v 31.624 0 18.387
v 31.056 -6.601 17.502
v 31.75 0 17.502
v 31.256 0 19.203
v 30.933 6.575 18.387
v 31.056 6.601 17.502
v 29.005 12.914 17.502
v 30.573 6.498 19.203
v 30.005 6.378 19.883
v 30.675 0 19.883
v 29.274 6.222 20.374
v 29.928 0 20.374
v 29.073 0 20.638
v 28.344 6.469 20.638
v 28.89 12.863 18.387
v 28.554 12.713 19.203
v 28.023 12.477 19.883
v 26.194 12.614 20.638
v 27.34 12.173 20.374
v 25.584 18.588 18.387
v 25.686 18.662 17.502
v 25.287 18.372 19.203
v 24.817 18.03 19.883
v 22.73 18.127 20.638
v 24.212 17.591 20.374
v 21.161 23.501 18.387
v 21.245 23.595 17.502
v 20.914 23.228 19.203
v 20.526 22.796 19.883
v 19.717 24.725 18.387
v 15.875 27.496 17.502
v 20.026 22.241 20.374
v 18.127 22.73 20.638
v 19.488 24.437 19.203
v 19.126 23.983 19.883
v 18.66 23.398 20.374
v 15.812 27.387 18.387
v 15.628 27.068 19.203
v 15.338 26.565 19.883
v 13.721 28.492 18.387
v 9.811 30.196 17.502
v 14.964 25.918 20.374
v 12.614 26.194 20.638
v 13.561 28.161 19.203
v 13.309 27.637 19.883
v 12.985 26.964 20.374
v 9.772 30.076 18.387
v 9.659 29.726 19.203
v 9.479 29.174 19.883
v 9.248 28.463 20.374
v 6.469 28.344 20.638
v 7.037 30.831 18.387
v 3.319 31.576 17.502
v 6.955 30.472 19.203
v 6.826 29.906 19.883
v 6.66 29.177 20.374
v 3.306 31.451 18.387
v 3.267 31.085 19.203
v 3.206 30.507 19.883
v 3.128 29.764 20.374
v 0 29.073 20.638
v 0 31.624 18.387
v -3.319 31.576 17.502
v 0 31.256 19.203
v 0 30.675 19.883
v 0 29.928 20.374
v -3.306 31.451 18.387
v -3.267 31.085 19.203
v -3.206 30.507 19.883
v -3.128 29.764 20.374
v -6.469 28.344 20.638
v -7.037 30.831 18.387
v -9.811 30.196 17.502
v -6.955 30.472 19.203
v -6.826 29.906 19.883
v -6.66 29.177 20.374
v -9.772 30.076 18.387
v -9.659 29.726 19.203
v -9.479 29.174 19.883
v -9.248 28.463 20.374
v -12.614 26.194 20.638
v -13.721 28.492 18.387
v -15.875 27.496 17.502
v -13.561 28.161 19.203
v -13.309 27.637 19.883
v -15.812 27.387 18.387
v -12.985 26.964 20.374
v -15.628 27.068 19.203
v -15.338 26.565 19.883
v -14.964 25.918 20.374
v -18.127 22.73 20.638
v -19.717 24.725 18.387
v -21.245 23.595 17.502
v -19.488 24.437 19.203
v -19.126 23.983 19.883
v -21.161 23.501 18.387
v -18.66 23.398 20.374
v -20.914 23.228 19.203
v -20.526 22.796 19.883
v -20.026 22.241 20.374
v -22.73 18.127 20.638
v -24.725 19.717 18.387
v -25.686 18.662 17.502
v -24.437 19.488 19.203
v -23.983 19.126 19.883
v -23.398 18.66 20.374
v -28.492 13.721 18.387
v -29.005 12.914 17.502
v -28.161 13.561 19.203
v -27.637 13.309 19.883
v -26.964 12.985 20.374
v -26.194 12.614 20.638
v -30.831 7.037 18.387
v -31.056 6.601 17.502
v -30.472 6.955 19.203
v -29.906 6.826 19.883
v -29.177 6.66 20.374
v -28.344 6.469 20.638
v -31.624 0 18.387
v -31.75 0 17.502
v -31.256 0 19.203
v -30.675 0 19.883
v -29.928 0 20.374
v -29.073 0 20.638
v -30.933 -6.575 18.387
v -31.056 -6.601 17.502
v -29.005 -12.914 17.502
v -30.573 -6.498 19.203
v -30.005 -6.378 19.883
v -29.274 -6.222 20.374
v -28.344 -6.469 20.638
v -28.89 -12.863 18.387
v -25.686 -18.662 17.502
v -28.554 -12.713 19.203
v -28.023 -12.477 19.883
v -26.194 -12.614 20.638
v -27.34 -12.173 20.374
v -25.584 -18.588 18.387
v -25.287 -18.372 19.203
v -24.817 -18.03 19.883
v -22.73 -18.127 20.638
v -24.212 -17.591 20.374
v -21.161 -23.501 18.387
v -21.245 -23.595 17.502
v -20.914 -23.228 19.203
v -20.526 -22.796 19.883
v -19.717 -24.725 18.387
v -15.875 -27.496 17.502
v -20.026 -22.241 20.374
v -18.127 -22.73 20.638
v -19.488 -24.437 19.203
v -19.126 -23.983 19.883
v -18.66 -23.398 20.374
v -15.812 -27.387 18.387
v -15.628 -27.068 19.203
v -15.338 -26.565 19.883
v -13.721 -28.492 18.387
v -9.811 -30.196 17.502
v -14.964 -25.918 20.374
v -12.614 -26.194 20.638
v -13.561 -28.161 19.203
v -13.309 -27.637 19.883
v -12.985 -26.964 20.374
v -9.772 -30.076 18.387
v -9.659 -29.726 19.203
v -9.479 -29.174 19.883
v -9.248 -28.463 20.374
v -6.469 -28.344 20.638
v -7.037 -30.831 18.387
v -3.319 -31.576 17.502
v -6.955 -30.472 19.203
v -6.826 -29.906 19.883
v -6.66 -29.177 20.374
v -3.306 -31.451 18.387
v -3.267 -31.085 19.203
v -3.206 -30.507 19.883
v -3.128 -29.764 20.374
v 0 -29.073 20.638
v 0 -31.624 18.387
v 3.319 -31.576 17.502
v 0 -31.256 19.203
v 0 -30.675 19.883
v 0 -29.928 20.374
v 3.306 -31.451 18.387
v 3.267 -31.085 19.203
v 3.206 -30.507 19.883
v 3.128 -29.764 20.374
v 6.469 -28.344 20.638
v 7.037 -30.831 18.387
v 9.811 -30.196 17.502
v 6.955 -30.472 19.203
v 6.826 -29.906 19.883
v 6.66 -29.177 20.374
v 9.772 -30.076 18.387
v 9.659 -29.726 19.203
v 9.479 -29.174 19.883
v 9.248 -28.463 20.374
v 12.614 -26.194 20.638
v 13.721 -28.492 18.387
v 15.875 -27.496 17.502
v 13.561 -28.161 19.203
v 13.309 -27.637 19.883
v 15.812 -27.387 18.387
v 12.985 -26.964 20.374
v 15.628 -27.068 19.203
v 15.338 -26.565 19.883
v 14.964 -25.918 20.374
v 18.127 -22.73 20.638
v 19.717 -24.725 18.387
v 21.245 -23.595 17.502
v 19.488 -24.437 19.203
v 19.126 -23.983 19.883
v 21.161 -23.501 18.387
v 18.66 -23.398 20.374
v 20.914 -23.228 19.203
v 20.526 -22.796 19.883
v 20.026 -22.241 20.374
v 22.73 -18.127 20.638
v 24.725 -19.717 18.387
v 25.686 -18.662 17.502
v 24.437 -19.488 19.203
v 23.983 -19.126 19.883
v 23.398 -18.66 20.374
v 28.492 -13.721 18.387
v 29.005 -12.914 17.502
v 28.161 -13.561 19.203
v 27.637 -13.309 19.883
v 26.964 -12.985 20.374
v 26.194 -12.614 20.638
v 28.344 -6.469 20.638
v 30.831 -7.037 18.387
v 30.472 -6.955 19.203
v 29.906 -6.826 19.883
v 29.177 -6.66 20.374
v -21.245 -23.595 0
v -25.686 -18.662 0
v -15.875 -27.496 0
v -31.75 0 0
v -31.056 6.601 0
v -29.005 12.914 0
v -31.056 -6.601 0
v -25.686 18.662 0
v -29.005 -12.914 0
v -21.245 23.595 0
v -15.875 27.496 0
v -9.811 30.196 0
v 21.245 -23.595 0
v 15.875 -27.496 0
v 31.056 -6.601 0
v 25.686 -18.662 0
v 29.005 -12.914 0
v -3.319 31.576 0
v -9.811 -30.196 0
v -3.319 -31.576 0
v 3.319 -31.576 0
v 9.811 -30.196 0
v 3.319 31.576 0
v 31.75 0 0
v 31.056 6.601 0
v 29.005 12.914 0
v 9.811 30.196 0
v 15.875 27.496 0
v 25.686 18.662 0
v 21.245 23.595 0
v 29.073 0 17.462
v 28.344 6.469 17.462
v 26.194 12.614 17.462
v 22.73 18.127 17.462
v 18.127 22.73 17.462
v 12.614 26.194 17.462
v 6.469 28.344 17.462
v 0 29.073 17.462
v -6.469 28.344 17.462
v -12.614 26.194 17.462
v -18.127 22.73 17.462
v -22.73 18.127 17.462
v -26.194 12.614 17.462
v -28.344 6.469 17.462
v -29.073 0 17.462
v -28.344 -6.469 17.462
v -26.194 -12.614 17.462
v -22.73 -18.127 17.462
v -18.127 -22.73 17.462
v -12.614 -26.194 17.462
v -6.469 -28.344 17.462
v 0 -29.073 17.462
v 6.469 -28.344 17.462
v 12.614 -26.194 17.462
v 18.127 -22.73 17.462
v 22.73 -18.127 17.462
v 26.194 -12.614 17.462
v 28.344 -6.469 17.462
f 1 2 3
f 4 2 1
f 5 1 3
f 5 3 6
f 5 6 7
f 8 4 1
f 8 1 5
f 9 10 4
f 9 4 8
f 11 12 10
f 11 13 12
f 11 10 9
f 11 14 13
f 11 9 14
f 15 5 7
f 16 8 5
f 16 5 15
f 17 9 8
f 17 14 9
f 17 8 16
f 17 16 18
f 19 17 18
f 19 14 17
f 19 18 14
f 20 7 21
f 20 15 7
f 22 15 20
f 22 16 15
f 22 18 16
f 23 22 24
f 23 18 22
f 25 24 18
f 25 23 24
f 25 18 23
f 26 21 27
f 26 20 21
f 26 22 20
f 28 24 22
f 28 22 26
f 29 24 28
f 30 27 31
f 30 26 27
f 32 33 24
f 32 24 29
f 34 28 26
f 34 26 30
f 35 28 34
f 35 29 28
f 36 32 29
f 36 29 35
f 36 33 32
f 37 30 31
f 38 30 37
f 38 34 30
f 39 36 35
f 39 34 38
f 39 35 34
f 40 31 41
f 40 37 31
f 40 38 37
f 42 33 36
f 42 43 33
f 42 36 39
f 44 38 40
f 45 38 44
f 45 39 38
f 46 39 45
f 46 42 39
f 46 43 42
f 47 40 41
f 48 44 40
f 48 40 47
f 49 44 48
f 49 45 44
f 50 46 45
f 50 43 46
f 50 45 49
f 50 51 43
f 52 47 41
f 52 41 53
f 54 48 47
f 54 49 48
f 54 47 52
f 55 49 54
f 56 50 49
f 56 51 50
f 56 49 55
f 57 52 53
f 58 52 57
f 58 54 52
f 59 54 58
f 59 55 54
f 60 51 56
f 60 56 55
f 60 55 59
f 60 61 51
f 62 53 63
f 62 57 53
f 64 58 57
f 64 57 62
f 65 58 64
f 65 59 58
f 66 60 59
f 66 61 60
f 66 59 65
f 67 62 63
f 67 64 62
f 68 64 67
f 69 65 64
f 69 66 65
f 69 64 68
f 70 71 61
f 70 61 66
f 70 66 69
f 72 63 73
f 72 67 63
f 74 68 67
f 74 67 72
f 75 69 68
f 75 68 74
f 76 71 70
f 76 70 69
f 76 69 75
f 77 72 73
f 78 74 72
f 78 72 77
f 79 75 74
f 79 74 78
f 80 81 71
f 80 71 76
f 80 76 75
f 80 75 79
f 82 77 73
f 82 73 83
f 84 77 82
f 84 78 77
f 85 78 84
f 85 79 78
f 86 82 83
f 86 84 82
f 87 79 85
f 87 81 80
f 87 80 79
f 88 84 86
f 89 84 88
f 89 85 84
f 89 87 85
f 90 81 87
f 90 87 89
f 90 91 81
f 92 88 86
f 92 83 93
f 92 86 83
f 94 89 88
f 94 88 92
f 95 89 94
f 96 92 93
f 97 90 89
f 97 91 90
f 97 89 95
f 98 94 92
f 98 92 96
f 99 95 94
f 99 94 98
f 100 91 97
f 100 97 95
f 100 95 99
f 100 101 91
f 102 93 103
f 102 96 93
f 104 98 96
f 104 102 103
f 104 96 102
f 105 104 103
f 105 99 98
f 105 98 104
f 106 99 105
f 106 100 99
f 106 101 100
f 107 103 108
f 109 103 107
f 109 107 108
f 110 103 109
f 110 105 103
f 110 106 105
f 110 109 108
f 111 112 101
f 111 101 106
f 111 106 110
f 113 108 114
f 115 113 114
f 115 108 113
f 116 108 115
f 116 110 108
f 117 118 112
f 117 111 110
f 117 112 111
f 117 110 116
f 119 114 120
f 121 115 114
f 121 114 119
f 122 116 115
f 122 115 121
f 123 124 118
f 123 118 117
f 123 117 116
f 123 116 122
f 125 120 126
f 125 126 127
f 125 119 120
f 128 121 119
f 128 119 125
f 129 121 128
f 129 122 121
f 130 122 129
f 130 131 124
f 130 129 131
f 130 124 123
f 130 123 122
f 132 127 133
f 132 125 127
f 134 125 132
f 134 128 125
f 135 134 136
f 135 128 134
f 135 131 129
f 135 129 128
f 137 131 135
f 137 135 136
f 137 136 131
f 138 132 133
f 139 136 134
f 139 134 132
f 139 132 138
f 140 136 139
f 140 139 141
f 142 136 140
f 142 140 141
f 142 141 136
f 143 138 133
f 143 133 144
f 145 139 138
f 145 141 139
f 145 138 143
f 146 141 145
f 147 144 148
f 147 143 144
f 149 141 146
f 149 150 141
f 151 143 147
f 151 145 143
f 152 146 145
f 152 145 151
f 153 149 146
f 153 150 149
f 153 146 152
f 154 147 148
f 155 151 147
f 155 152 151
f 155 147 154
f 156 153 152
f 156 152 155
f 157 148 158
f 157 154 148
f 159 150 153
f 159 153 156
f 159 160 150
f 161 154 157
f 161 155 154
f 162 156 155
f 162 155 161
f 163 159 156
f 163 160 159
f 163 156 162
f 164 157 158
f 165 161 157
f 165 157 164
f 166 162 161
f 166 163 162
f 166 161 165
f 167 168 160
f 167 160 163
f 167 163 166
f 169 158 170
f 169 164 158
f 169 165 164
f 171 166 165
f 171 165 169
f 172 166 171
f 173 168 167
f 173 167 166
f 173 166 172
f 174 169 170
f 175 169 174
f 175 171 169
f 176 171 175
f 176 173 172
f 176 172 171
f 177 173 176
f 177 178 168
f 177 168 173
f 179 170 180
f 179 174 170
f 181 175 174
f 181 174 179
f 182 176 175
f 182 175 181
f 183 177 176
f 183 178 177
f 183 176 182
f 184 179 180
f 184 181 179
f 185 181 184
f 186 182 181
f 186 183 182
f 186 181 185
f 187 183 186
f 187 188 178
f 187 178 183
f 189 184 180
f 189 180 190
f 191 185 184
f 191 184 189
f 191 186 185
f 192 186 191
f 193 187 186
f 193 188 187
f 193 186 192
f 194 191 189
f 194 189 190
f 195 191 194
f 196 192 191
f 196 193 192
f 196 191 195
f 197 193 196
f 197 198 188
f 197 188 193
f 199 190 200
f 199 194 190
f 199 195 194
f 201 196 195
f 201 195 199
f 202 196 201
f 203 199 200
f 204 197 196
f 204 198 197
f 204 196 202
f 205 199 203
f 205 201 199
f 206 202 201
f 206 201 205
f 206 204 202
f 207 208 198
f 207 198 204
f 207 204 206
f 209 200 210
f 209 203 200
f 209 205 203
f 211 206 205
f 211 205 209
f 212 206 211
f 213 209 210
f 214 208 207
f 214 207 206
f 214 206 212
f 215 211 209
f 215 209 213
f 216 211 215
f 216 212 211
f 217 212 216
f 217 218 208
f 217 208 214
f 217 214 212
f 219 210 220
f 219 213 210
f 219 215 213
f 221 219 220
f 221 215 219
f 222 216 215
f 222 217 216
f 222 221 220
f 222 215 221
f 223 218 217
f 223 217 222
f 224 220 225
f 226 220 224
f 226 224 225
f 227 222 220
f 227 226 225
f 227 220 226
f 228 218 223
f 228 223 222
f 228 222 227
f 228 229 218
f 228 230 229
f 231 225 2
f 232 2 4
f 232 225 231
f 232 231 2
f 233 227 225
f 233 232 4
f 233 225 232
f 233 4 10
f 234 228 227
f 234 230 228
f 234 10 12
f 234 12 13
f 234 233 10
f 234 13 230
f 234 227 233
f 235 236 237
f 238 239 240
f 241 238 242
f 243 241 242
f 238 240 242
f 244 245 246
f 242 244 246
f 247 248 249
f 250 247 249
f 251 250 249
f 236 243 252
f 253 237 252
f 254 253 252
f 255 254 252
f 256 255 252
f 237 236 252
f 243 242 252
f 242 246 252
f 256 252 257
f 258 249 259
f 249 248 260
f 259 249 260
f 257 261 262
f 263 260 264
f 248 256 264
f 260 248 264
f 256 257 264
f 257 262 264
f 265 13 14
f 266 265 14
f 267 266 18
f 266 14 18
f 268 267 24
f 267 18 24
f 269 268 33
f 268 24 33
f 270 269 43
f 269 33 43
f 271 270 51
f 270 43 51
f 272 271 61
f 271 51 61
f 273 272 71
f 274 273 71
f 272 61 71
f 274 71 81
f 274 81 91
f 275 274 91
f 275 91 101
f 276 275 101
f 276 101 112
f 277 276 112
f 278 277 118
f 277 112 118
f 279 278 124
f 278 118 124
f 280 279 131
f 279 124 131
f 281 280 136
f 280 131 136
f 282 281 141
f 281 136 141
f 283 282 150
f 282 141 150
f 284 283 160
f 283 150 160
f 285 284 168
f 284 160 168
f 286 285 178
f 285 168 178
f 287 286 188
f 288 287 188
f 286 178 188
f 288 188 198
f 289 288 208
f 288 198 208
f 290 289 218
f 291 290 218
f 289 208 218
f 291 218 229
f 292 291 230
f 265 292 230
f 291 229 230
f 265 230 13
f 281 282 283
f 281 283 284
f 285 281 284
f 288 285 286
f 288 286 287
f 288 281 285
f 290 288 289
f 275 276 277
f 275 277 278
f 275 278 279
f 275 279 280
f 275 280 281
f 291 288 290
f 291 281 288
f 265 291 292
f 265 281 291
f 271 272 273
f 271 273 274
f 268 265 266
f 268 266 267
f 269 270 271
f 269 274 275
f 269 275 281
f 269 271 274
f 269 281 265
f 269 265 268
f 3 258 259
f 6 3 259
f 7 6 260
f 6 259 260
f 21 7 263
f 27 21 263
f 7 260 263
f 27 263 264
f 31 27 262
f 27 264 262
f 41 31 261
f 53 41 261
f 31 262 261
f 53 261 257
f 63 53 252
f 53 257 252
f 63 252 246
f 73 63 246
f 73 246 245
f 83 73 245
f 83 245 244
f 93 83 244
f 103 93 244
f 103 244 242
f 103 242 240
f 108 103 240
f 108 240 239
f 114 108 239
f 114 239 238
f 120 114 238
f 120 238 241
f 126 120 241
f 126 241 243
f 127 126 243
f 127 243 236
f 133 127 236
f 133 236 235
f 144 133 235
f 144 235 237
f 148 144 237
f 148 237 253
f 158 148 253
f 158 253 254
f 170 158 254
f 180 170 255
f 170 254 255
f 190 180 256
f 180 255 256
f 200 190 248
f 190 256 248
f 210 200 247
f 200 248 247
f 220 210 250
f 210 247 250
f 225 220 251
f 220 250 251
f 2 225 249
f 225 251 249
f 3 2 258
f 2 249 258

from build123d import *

# Parameters (mm, degrees)
F0_R     = 31.75
F1_DEPTH = 20.6375
F2_R     = 29.07284
F3_DEPTH = 3.175


# Not quite as in the source:
# - a fillet or chamfer that OpenCascade refuses, or shapes differently, is made with other operations: its cross-section is extruded or revolved along the edge and cut away or added


with BuildPart() as f1:
    # F0 (on Top) → F1 (new body)
    with BuildSketch(Plane.XY):
        Circle(F0_R)
    extrude(amount=F1_DEPTH)

    # F2 (on face) → F3 (cut)
    with BuildSketch(Plane.XY.offset(20.6375)):
        Circle(F2_R)
    extrude(amount=-F3_DEPTH, mode=Mode.SUBTRACT)

    # F4: fillet of radius 3.175 on 1 edges, made by hand

    # F4_s1 → F4_t2 (revolve, cut)
    with BuildSketch(Plane.XZ):
        with BuildLine():
            ThreePointArc((31.75, 17.5017735556), (30.9896704744, 19.5633243068), (29.07284, 20.6375))
            Line((29.07284, 20.6375), (31.75, 20.6375))
            Line((31.75, 20.6375), (31.75, 17.5017735556))
        make_face()
    revolve(axis=Axis((0, 0, 20.6375), (0, 0, 1)), mode=Mode.SUBTRACT)


solid = f1.part
